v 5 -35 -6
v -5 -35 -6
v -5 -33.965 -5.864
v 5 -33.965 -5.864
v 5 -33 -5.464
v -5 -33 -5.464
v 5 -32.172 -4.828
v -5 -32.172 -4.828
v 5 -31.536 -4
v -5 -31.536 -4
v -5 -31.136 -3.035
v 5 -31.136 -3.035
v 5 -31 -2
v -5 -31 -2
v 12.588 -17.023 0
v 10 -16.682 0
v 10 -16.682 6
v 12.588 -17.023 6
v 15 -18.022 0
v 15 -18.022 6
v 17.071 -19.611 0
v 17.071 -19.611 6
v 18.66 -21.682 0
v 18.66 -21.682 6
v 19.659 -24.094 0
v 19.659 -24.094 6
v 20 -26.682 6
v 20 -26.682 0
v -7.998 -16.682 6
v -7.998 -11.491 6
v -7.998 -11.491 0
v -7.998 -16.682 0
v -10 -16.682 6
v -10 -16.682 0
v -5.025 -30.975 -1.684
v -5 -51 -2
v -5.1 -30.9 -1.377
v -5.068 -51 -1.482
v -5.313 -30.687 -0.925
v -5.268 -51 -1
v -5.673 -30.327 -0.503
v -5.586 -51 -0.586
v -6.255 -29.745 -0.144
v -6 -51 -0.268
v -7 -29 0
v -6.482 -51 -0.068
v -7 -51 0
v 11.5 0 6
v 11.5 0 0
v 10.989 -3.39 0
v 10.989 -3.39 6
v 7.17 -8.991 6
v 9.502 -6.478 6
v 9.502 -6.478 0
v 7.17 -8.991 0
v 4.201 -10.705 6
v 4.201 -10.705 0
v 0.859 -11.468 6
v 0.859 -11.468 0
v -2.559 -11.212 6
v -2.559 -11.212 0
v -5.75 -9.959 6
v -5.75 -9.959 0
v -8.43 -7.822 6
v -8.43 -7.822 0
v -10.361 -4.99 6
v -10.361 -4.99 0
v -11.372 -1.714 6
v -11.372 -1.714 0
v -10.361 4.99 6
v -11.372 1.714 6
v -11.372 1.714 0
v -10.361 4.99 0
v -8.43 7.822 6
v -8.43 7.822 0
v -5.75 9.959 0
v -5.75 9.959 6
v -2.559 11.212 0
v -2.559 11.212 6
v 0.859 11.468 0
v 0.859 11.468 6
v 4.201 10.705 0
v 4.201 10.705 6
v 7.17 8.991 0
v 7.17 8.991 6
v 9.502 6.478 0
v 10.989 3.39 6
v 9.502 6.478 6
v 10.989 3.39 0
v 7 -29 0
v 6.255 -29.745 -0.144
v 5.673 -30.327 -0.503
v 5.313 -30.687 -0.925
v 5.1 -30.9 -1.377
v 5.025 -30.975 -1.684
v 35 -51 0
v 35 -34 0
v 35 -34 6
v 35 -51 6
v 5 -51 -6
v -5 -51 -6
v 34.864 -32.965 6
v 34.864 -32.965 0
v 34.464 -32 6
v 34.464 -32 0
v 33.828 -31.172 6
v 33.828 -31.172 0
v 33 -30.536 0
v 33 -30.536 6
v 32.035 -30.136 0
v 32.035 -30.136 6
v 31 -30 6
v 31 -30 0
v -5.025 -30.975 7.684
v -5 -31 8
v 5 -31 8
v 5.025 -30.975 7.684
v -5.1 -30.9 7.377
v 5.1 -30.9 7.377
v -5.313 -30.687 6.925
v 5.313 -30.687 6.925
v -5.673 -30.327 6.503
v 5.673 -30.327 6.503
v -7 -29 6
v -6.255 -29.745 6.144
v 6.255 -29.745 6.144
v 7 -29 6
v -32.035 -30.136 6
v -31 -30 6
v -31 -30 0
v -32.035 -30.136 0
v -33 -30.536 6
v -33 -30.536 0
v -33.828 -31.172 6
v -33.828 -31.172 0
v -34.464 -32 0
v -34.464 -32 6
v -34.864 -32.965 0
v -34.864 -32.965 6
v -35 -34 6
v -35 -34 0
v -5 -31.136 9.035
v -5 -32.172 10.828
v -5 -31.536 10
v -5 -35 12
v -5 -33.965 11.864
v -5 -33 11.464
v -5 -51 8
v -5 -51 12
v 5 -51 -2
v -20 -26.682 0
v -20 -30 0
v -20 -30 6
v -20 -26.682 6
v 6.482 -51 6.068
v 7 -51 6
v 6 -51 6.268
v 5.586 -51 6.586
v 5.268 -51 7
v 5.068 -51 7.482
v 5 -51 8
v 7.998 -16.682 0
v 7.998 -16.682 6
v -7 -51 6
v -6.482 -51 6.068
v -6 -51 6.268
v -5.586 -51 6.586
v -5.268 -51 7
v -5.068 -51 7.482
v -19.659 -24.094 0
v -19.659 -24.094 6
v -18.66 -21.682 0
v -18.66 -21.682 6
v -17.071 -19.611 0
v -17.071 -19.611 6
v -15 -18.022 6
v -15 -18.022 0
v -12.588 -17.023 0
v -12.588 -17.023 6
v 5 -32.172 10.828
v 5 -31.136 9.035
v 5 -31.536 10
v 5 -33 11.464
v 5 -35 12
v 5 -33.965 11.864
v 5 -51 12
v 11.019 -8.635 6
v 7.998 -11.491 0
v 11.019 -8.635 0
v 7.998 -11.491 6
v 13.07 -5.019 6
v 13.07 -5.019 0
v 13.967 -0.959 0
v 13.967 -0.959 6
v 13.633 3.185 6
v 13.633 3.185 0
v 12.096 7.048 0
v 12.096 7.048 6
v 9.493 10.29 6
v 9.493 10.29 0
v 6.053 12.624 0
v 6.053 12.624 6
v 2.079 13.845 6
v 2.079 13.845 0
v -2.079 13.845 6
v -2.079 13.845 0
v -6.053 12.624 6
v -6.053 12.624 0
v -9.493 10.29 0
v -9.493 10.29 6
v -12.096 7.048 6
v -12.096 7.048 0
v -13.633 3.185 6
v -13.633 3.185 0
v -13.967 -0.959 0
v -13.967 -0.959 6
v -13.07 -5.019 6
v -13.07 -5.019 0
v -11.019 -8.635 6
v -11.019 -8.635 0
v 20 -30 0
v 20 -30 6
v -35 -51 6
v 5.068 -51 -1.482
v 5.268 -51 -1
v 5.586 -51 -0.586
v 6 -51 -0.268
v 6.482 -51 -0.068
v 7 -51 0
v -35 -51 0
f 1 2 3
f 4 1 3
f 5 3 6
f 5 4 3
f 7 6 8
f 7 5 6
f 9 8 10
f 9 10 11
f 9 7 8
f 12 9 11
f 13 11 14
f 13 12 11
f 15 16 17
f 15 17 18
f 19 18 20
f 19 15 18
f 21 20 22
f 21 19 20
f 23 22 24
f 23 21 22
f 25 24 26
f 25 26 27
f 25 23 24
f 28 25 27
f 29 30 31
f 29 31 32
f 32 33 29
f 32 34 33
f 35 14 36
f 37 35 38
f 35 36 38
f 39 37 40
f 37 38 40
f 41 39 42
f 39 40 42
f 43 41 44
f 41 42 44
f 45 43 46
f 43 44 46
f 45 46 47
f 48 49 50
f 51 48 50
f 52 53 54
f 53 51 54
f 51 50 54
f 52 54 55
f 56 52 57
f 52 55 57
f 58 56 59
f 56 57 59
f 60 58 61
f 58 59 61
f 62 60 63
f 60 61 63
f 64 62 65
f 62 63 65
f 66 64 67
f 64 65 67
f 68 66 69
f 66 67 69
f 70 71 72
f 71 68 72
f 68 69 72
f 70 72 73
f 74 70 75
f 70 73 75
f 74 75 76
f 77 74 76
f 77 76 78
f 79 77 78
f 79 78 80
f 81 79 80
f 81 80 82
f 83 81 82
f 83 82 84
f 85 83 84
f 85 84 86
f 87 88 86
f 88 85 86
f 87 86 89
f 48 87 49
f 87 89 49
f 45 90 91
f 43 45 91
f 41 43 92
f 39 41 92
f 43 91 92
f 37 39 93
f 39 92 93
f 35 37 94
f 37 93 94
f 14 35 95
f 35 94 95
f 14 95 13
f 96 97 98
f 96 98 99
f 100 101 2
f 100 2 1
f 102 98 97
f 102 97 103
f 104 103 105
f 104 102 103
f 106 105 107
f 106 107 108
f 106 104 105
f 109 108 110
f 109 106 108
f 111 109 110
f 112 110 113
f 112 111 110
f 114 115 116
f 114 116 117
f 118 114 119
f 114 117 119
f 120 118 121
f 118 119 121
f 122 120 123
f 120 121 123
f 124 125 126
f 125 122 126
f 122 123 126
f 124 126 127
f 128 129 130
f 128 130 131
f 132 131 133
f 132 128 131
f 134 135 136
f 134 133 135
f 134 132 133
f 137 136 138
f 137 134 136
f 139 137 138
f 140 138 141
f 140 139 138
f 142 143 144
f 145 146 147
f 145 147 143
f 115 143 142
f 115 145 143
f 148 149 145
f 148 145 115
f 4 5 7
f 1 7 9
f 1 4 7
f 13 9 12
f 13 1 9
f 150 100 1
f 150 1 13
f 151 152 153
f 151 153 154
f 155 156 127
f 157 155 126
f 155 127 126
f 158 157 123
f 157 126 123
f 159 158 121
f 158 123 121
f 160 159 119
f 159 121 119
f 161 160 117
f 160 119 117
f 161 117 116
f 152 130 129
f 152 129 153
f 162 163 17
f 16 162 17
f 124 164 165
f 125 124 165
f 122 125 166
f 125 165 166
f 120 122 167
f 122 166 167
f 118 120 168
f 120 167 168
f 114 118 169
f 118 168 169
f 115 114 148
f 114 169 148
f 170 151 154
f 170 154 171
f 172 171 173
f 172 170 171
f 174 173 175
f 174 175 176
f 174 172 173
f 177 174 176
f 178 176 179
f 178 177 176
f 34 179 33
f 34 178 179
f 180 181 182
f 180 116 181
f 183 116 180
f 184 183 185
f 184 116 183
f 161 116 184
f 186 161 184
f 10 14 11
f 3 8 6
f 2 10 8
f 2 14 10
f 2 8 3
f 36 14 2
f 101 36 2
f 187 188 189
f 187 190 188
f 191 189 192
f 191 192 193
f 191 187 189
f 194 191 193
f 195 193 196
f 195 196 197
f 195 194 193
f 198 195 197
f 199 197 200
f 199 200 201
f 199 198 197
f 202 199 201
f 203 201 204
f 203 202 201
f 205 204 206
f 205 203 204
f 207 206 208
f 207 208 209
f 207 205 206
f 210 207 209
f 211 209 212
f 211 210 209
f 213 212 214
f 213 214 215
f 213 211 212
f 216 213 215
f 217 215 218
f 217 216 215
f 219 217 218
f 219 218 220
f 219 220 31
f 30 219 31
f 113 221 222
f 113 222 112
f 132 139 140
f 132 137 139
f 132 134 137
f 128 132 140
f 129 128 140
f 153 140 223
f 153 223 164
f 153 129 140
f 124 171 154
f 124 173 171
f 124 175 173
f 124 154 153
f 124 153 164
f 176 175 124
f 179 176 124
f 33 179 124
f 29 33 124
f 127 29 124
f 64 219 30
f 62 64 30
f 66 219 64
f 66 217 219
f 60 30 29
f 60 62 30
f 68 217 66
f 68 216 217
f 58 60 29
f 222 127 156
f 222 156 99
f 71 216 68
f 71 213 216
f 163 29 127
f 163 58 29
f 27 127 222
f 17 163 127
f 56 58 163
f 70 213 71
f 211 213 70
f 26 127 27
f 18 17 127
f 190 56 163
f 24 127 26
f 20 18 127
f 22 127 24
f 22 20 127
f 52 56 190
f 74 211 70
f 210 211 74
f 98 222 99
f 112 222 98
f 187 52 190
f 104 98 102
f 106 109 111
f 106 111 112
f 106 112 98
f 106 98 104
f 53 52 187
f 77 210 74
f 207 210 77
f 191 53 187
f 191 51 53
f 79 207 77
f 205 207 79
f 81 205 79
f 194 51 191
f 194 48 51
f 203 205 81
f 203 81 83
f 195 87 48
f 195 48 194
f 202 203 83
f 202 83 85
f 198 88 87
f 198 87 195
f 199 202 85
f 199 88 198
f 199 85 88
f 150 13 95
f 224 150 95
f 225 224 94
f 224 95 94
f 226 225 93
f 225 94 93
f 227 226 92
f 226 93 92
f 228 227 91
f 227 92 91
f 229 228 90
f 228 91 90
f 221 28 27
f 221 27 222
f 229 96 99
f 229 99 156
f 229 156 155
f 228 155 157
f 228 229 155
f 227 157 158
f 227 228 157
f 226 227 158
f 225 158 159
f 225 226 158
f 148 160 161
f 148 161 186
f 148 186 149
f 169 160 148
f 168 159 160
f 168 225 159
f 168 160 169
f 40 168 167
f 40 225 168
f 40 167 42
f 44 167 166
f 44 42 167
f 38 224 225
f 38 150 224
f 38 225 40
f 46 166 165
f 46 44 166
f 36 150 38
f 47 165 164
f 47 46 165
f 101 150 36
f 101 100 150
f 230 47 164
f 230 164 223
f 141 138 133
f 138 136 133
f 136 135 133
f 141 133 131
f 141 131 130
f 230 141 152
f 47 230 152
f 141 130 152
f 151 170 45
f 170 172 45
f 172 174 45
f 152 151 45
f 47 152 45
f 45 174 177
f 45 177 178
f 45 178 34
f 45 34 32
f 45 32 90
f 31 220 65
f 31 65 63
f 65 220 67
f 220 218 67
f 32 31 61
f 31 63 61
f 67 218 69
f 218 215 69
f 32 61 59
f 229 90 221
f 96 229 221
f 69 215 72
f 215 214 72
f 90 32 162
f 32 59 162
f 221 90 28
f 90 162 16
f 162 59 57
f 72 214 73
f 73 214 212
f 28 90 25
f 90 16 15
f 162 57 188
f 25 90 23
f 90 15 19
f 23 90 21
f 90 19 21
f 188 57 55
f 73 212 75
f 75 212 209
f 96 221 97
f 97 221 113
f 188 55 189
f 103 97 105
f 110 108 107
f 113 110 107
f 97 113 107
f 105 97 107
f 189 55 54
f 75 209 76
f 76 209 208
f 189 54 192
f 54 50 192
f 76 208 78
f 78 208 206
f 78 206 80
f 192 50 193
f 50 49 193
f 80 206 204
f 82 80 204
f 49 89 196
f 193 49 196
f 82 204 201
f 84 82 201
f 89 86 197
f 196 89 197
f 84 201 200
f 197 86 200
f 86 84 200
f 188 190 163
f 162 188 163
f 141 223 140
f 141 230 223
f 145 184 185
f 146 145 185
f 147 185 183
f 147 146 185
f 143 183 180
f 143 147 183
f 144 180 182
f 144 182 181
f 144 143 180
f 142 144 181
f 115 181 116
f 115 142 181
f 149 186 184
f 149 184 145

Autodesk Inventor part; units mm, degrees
ref_plane "YZ Plane" through (0, 0, 0) normal (1, 0, 0) x (0, 1, 0)
ref_plane "XZ Plane" through (0, 0, 0) normal (0, 1, 0) x (-1, 0, 0)
ref_plane "XY Plane" through (0, 0, 0) normal (0, 0, 1) x (1, 0, 0)
sketch "Sketch1" plane through (0, 0, 0) normal (0, 0, 1) x (1, 0, 0)
  circle A0 centre (0, 0) radius 11.5
  arc A1 (20, 0) -> (-20, 0) centre (0, 0) ccw
  line L0 (20, 0) -> (20, -30)
  line L1 (-20, -30) -> (-20, 0)
  line L2 (35, -30) -> (35, -51)
  line L3 (35, -51) -> (-35, -51)
  line L4 (-35, -51) -> (-35, -30)
  line L5 (-35, -30) -> (-20, -30)
  line L6 (20, -30) -> (35, -30)
extrude "Extrusion1" add sketch "Sketch1" along normal blind 6
sketch "Sketch2" plane through (-35, -51, 0) normal (0, -1, 0) x (1, 0, 0)
  line L0 (30, 12) -> (30, -6)
  line L1 (30, -6) -> (40, -6)
  line L2 (40, -6) -> (40, 12)
  line L3 (40, 12) -> (30, 12)
  line L4 (30, 12) -> (40, -6) construction
  line L5 (30, -6) -> (40, 12) construction
  point P0 (35, 0)
  point P1 (35, 3)
  dimension "d7" = 18
  dimension "d8" = 10
extrude "Extrusion2" add sketch "Sketch2" against normal blind 20
fillet "Fillet1" radius 2 6 edges at (5, -41, 6) (-5, -41, 6) (5, -41, 0) (-5, -41, 0) (0, -31, 0) (0, -31, 6)
fillet "Fillet2" radius 4 2 edges at (0, -31, 12) (0, -31, -6)
fillet "Fillet3" radius 4 2 edges at (-35, -30, 3) (35, -30, 3)
sketch "Sketch3" plane through (0, 0, 6) normal (0, 0, 1) x (1, 0, 0)
  arc A0 (7.9976, -11.4908) -> (-7.9976, -11.4908) centre (0, 0) ccw
  arc A1 (7.9976, -16.682) -> (-7.9976, -16.682) centre (0, 0) ccw
  line L0 (4, -12.8417) -> (-4, -19.4934) construction
  line L1 (-4, -12.8417) -> (4, -19.4934) construction
  line L2 (-7.9976, -11.4908) -> (-7.9976, -16.682)
  line L3 (7.9976, -11.4908) -> (7.9976, -16.682)
  point P0 (0, -16.1675)
extrude "Extrusion3" cut sketch "Sketch3" against normal blind 10
sketch "Sketch4" plane through (0, 0, 6) normal (0, 0, 1) x (1, 0, 0)
  line L0 (-7.9976, -11.4908) -> (-7.9976, -16.682) projected
  line L1 (-7.9976, -16.682) -> (-19.8959, -16.682)
  arc A0 (7.9976, -16.682) -> (-7.9976, -16.682) centre (0, 0) ccw projected
  line L2 (7.9976, -16.682) -> (20, -16.682)
  line L3 (20, -30) -> (20, 0) projected
  line L4 (-7.9976, -16.682) -> (-17.0011, 1.4894)
  line L5 (-17.0011, 1.4894) -> (-8.7801, 14.2319)
  line L6 (-8.7801, 14.2319) -> (1.2495, 15.1362)
  line L7 (1.2495, 15.1362) -> (10.7036, 12.5877)
  line L8 (10.7036, 12.5877) -> (15.6744, 3.4985)
  line L9 (15.6744, 3.4985) -> (15.6744, -3.8181)
  line L10 (15.6744, -3.8181) -> (10.5163, -11.3974)
  line L11 (10.5163, -11.3974) -> (8.7045, -14.0594)
  line L12 (8.7045, -14.0594) -> (7.9976, -16.682)
  line L13 (-19.8959, -16.682) -> (-31.3329, 15.1362)
  line L14 (-31.3329, 15.1362) -> (-3.7653, 25.0453)
  line L15 (-3.7653, 25.0453) -> (28.3359, 16.3269)
  line L16 (28.3359, 16.3269) -> (26.8111, -11.3974)
  line L17 (26.8111, -11.3974) -> (20, -16.682)
extrude "Extrusion4" cut sketch "Sketch4" against normal blind 10
sketch "Sketch5" plane through (-19.8959, -16.682, 6) normal (0, 1, 0) x (1, 0, 0)
  line L0 (-7.0101, -7.2709) -> (2.851, -7.2709)
  line L1 (2.851, -7.2709) -> (2.851, 8.3942)
  line L2 (2.851, 8.3942) -> (-7.0101, 8.3942)
  line L3 (-7.0101, 8.3942) -> (-7.0101, -7.2709)
  point P0 (19.8959, 6)
extrude "Extrusion5" cut sketch "Sketch5" along normal blind 10
fillet "Fillet4" radius 10 2 edges at (-20, -16.682, 3) (20, -16.682, 3)
properties part number "Secondary mount"
